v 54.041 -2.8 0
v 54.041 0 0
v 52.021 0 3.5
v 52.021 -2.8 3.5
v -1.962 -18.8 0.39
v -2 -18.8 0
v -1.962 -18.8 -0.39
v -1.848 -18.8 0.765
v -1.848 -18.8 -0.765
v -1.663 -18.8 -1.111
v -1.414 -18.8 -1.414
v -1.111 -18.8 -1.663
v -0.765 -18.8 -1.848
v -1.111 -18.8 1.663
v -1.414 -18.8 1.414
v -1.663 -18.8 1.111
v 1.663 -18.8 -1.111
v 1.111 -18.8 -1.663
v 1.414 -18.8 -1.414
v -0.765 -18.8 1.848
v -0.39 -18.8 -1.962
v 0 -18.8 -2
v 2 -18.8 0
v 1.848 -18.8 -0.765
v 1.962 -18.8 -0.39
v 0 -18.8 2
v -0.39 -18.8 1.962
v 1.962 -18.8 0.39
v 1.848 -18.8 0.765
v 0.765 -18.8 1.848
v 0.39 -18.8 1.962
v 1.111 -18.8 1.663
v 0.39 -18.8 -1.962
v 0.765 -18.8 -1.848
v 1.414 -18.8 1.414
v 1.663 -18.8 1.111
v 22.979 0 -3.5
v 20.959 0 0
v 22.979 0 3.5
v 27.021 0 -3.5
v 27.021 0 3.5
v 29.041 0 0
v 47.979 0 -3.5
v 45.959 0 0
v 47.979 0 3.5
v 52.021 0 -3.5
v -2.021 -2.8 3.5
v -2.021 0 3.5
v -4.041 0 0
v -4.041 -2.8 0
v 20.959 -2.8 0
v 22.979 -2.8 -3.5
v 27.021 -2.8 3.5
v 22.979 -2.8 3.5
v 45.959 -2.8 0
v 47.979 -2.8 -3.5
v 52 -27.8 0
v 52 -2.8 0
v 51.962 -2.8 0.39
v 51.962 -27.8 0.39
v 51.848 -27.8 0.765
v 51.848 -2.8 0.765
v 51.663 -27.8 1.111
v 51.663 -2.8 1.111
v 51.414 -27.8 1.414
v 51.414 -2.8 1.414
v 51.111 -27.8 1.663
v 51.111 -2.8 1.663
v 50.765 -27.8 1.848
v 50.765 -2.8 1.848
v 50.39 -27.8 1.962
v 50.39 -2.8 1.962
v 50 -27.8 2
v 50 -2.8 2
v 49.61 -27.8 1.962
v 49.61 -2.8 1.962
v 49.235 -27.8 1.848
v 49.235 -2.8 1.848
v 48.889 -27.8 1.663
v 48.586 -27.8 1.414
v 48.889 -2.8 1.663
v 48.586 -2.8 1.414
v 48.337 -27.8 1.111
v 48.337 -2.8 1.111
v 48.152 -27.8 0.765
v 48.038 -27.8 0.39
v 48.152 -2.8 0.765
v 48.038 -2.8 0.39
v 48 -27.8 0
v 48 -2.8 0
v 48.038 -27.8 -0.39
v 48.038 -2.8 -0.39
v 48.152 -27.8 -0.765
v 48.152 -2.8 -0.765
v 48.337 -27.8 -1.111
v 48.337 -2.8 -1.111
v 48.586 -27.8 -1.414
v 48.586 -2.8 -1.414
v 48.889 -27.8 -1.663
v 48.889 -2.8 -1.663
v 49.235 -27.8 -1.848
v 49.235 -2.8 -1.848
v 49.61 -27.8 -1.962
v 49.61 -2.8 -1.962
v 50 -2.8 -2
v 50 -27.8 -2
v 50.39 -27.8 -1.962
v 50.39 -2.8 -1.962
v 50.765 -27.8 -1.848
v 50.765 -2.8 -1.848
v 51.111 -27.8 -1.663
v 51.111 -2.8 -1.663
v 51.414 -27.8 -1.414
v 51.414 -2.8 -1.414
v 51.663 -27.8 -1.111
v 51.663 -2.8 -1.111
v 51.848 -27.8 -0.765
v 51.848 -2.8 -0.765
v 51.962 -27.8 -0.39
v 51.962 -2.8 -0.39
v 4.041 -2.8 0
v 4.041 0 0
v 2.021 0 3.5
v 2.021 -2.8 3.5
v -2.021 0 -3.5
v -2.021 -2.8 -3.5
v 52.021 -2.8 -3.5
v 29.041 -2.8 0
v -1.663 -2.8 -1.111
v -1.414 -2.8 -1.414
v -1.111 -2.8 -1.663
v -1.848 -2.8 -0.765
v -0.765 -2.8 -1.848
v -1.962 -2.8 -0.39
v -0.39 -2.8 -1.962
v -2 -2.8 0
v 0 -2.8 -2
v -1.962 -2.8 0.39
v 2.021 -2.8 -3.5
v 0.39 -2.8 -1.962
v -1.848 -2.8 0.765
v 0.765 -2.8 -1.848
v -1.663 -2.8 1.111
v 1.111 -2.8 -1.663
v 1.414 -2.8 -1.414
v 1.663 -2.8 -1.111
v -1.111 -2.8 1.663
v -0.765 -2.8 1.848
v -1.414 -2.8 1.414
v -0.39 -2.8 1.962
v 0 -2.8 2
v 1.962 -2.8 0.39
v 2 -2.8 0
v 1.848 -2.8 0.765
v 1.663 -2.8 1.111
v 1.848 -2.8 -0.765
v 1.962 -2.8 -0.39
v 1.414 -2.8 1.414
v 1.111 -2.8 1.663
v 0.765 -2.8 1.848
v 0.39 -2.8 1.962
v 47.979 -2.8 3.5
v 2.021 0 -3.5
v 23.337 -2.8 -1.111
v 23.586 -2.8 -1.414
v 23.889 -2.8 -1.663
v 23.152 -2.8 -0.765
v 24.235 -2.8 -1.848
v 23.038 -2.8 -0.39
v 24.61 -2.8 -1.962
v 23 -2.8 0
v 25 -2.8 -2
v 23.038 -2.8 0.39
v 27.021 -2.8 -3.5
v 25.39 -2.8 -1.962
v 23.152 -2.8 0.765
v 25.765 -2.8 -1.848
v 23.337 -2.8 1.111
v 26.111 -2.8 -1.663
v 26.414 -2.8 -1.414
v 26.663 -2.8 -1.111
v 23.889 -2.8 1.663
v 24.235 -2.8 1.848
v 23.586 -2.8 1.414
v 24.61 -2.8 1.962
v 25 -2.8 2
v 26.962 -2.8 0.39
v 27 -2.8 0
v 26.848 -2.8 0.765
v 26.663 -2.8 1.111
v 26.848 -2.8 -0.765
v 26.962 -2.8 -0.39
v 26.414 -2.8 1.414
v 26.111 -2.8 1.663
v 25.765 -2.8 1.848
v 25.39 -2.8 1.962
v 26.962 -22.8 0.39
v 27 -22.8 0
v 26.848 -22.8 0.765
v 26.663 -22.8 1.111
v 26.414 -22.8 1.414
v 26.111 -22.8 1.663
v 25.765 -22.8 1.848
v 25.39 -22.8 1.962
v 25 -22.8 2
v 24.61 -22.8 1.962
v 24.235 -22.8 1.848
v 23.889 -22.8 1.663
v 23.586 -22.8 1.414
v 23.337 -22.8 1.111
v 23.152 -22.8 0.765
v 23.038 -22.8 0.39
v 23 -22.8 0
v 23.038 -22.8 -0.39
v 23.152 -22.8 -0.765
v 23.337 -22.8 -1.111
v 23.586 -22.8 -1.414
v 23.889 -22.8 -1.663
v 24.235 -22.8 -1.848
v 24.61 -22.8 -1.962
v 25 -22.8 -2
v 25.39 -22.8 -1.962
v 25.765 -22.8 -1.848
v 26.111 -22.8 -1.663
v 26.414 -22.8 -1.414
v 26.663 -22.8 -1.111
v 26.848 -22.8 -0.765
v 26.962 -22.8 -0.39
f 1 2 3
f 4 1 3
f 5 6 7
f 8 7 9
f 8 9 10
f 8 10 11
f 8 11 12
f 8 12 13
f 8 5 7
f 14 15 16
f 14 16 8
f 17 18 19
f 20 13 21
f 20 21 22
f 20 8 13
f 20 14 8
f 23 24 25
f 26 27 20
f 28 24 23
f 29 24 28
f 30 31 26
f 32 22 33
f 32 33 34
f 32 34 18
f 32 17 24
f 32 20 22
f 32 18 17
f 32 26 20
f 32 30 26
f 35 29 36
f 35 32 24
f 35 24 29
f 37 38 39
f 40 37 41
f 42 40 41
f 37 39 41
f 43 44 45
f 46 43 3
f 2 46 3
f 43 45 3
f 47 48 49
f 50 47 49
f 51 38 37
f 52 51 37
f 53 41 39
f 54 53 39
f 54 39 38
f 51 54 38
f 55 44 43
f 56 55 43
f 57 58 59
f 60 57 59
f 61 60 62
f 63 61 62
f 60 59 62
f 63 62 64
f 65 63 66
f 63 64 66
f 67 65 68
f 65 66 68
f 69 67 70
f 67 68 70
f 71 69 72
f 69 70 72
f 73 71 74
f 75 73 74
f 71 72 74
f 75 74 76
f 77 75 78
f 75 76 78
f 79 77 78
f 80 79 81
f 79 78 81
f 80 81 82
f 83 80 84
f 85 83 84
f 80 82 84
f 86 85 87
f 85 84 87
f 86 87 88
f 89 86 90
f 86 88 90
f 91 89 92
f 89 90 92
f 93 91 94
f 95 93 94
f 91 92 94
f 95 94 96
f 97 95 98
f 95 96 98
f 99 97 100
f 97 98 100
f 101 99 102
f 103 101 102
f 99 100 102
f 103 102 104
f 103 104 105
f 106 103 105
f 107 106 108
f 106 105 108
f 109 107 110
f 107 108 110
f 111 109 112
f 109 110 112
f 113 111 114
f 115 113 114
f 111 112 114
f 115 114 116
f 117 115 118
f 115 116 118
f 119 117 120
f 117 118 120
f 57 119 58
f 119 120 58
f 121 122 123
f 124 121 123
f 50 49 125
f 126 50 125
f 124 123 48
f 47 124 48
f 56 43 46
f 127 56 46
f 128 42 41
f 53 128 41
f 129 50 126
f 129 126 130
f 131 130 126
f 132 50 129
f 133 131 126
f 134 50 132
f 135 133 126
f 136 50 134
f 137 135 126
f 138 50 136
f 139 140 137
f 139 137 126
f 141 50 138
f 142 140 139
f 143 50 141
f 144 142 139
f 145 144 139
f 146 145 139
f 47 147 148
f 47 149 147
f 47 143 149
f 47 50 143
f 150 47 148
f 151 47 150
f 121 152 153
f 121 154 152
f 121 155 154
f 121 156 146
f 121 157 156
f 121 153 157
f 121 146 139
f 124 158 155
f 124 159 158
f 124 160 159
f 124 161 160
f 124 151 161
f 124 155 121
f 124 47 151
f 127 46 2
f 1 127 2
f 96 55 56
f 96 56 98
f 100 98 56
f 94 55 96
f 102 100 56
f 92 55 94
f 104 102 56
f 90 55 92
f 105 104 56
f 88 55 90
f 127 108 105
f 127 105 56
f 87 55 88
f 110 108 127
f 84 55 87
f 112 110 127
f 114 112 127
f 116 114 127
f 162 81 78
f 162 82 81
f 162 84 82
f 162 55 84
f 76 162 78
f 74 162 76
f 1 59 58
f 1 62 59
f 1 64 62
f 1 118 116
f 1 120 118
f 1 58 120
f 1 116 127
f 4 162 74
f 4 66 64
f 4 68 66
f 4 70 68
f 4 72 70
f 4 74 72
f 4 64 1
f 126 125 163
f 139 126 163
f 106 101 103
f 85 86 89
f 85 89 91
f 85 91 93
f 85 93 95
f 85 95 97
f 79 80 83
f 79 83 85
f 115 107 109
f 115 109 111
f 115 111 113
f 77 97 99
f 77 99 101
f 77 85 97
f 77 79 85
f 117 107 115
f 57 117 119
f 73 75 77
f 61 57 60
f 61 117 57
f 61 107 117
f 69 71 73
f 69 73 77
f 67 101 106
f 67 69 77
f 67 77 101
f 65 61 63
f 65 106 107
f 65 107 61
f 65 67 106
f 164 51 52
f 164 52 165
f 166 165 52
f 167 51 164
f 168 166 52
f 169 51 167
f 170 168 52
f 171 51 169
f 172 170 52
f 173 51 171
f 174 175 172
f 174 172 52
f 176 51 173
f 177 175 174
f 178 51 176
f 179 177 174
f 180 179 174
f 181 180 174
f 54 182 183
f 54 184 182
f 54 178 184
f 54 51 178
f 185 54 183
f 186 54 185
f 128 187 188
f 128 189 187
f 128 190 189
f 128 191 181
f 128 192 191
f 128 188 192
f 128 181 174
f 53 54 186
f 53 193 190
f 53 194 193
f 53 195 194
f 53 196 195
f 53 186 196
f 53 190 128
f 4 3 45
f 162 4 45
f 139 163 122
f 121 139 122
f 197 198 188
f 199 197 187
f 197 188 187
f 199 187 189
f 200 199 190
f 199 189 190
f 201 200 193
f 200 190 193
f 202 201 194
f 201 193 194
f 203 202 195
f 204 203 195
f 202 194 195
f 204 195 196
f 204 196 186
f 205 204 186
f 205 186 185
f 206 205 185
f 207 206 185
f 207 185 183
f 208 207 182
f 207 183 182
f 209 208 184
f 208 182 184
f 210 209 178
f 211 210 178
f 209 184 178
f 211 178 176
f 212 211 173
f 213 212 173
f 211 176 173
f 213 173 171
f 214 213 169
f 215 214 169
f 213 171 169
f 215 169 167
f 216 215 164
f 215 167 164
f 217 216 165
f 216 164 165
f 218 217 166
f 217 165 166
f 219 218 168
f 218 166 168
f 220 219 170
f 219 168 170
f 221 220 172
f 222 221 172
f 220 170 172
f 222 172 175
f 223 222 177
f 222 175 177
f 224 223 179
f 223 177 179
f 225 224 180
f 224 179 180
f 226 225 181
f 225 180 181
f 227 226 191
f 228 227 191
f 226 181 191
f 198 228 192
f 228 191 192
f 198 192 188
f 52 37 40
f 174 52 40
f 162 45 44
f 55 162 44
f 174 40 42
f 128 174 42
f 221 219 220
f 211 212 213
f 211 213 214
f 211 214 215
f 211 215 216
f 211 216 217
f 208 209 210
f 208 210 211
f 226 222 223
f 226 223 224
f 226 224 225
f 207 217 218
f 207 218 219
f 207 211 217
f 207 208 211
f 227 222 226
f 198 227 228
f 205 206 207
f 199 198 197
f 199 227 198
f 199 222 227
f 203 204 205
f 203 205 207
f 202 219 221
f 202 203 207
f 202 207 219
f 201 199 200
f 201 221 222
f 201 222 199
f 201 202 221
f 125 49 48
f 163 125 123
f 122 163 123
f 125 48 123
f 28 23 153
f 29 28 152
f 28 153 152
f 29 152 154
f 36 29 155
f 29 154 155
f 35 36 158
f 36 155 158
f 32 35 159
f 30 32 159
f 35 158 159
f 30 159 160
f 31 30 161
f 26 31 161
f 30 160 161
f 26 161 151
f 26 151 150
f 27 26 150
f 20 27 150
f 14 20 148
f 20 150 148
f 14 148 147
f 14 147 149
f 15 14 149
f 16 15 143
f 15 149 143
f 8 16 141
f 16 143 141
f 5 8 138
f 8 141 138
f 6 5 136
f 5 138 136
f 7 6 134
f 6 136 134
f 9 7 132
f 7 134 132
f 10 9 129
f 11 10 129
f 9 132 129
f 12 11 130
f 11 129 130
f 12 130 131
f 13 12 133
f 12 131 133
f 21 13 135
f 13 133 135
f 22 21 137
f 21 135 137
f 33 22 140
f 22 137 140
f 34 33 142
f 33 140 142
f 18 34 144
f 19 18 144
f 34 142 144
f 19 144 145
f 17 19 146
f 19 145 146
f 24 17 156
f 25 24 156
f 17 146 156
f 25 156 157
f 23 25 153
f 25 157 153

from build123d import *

# Parameters (mm, degrees)
F1_DEPTH = 2.8
F2_R     = 2
F3_DEPTH = 16
F4_DEPTH = 20
F5_DEPTH = 25


with BuildPart() as f1:
    # F0 (on Front) → F1 (new body)
    with BuildSketch(Plane.XZ):
        Polygon((4.041452, 0), (2.020726, 3.5), (-2.020726, 3.5), (-4.041452, 0), (-2.020726, -3.5), (2.020726, -3.5), align=None)
        Polygon((29.041452, 0), (27.020726, 3.5), (22.979274, 3.5), (20.958548, 0), (22.979274, -3.5), (27.020726, -3.5), align=None)
        Polygon((54.041452, 0), (52.020726, 3.5), (47.979274, 3.5), (45.958548, 0), (47.979274, -3.5), (52.020726, -3.5), align=None)
    extrude(amount=F1_DEPTH)

    # F2 (on face) → F3 (join)
    with BuildSketch(Plane.XZ.offset(2.8)):
        Circle(F2_R)
    extrude(amount=F3_DEPTH)

    # F2 (on face) → F4 (join)
    with BuildSketch(Plane.XZ.offset(2.8)):
        with Locations((25, 0)):
            Circle(F2_R)
    extrude(amount=F4_DEPTH)

    # F2 (on face) → F5 (join)
    with BuildSketch(Plane.XZ.offset(2.8)):
        with Locations((50, 0)):
            Circle(F2_R)
    extrude(amount=F5_DEPTH)


solid = f1.part
